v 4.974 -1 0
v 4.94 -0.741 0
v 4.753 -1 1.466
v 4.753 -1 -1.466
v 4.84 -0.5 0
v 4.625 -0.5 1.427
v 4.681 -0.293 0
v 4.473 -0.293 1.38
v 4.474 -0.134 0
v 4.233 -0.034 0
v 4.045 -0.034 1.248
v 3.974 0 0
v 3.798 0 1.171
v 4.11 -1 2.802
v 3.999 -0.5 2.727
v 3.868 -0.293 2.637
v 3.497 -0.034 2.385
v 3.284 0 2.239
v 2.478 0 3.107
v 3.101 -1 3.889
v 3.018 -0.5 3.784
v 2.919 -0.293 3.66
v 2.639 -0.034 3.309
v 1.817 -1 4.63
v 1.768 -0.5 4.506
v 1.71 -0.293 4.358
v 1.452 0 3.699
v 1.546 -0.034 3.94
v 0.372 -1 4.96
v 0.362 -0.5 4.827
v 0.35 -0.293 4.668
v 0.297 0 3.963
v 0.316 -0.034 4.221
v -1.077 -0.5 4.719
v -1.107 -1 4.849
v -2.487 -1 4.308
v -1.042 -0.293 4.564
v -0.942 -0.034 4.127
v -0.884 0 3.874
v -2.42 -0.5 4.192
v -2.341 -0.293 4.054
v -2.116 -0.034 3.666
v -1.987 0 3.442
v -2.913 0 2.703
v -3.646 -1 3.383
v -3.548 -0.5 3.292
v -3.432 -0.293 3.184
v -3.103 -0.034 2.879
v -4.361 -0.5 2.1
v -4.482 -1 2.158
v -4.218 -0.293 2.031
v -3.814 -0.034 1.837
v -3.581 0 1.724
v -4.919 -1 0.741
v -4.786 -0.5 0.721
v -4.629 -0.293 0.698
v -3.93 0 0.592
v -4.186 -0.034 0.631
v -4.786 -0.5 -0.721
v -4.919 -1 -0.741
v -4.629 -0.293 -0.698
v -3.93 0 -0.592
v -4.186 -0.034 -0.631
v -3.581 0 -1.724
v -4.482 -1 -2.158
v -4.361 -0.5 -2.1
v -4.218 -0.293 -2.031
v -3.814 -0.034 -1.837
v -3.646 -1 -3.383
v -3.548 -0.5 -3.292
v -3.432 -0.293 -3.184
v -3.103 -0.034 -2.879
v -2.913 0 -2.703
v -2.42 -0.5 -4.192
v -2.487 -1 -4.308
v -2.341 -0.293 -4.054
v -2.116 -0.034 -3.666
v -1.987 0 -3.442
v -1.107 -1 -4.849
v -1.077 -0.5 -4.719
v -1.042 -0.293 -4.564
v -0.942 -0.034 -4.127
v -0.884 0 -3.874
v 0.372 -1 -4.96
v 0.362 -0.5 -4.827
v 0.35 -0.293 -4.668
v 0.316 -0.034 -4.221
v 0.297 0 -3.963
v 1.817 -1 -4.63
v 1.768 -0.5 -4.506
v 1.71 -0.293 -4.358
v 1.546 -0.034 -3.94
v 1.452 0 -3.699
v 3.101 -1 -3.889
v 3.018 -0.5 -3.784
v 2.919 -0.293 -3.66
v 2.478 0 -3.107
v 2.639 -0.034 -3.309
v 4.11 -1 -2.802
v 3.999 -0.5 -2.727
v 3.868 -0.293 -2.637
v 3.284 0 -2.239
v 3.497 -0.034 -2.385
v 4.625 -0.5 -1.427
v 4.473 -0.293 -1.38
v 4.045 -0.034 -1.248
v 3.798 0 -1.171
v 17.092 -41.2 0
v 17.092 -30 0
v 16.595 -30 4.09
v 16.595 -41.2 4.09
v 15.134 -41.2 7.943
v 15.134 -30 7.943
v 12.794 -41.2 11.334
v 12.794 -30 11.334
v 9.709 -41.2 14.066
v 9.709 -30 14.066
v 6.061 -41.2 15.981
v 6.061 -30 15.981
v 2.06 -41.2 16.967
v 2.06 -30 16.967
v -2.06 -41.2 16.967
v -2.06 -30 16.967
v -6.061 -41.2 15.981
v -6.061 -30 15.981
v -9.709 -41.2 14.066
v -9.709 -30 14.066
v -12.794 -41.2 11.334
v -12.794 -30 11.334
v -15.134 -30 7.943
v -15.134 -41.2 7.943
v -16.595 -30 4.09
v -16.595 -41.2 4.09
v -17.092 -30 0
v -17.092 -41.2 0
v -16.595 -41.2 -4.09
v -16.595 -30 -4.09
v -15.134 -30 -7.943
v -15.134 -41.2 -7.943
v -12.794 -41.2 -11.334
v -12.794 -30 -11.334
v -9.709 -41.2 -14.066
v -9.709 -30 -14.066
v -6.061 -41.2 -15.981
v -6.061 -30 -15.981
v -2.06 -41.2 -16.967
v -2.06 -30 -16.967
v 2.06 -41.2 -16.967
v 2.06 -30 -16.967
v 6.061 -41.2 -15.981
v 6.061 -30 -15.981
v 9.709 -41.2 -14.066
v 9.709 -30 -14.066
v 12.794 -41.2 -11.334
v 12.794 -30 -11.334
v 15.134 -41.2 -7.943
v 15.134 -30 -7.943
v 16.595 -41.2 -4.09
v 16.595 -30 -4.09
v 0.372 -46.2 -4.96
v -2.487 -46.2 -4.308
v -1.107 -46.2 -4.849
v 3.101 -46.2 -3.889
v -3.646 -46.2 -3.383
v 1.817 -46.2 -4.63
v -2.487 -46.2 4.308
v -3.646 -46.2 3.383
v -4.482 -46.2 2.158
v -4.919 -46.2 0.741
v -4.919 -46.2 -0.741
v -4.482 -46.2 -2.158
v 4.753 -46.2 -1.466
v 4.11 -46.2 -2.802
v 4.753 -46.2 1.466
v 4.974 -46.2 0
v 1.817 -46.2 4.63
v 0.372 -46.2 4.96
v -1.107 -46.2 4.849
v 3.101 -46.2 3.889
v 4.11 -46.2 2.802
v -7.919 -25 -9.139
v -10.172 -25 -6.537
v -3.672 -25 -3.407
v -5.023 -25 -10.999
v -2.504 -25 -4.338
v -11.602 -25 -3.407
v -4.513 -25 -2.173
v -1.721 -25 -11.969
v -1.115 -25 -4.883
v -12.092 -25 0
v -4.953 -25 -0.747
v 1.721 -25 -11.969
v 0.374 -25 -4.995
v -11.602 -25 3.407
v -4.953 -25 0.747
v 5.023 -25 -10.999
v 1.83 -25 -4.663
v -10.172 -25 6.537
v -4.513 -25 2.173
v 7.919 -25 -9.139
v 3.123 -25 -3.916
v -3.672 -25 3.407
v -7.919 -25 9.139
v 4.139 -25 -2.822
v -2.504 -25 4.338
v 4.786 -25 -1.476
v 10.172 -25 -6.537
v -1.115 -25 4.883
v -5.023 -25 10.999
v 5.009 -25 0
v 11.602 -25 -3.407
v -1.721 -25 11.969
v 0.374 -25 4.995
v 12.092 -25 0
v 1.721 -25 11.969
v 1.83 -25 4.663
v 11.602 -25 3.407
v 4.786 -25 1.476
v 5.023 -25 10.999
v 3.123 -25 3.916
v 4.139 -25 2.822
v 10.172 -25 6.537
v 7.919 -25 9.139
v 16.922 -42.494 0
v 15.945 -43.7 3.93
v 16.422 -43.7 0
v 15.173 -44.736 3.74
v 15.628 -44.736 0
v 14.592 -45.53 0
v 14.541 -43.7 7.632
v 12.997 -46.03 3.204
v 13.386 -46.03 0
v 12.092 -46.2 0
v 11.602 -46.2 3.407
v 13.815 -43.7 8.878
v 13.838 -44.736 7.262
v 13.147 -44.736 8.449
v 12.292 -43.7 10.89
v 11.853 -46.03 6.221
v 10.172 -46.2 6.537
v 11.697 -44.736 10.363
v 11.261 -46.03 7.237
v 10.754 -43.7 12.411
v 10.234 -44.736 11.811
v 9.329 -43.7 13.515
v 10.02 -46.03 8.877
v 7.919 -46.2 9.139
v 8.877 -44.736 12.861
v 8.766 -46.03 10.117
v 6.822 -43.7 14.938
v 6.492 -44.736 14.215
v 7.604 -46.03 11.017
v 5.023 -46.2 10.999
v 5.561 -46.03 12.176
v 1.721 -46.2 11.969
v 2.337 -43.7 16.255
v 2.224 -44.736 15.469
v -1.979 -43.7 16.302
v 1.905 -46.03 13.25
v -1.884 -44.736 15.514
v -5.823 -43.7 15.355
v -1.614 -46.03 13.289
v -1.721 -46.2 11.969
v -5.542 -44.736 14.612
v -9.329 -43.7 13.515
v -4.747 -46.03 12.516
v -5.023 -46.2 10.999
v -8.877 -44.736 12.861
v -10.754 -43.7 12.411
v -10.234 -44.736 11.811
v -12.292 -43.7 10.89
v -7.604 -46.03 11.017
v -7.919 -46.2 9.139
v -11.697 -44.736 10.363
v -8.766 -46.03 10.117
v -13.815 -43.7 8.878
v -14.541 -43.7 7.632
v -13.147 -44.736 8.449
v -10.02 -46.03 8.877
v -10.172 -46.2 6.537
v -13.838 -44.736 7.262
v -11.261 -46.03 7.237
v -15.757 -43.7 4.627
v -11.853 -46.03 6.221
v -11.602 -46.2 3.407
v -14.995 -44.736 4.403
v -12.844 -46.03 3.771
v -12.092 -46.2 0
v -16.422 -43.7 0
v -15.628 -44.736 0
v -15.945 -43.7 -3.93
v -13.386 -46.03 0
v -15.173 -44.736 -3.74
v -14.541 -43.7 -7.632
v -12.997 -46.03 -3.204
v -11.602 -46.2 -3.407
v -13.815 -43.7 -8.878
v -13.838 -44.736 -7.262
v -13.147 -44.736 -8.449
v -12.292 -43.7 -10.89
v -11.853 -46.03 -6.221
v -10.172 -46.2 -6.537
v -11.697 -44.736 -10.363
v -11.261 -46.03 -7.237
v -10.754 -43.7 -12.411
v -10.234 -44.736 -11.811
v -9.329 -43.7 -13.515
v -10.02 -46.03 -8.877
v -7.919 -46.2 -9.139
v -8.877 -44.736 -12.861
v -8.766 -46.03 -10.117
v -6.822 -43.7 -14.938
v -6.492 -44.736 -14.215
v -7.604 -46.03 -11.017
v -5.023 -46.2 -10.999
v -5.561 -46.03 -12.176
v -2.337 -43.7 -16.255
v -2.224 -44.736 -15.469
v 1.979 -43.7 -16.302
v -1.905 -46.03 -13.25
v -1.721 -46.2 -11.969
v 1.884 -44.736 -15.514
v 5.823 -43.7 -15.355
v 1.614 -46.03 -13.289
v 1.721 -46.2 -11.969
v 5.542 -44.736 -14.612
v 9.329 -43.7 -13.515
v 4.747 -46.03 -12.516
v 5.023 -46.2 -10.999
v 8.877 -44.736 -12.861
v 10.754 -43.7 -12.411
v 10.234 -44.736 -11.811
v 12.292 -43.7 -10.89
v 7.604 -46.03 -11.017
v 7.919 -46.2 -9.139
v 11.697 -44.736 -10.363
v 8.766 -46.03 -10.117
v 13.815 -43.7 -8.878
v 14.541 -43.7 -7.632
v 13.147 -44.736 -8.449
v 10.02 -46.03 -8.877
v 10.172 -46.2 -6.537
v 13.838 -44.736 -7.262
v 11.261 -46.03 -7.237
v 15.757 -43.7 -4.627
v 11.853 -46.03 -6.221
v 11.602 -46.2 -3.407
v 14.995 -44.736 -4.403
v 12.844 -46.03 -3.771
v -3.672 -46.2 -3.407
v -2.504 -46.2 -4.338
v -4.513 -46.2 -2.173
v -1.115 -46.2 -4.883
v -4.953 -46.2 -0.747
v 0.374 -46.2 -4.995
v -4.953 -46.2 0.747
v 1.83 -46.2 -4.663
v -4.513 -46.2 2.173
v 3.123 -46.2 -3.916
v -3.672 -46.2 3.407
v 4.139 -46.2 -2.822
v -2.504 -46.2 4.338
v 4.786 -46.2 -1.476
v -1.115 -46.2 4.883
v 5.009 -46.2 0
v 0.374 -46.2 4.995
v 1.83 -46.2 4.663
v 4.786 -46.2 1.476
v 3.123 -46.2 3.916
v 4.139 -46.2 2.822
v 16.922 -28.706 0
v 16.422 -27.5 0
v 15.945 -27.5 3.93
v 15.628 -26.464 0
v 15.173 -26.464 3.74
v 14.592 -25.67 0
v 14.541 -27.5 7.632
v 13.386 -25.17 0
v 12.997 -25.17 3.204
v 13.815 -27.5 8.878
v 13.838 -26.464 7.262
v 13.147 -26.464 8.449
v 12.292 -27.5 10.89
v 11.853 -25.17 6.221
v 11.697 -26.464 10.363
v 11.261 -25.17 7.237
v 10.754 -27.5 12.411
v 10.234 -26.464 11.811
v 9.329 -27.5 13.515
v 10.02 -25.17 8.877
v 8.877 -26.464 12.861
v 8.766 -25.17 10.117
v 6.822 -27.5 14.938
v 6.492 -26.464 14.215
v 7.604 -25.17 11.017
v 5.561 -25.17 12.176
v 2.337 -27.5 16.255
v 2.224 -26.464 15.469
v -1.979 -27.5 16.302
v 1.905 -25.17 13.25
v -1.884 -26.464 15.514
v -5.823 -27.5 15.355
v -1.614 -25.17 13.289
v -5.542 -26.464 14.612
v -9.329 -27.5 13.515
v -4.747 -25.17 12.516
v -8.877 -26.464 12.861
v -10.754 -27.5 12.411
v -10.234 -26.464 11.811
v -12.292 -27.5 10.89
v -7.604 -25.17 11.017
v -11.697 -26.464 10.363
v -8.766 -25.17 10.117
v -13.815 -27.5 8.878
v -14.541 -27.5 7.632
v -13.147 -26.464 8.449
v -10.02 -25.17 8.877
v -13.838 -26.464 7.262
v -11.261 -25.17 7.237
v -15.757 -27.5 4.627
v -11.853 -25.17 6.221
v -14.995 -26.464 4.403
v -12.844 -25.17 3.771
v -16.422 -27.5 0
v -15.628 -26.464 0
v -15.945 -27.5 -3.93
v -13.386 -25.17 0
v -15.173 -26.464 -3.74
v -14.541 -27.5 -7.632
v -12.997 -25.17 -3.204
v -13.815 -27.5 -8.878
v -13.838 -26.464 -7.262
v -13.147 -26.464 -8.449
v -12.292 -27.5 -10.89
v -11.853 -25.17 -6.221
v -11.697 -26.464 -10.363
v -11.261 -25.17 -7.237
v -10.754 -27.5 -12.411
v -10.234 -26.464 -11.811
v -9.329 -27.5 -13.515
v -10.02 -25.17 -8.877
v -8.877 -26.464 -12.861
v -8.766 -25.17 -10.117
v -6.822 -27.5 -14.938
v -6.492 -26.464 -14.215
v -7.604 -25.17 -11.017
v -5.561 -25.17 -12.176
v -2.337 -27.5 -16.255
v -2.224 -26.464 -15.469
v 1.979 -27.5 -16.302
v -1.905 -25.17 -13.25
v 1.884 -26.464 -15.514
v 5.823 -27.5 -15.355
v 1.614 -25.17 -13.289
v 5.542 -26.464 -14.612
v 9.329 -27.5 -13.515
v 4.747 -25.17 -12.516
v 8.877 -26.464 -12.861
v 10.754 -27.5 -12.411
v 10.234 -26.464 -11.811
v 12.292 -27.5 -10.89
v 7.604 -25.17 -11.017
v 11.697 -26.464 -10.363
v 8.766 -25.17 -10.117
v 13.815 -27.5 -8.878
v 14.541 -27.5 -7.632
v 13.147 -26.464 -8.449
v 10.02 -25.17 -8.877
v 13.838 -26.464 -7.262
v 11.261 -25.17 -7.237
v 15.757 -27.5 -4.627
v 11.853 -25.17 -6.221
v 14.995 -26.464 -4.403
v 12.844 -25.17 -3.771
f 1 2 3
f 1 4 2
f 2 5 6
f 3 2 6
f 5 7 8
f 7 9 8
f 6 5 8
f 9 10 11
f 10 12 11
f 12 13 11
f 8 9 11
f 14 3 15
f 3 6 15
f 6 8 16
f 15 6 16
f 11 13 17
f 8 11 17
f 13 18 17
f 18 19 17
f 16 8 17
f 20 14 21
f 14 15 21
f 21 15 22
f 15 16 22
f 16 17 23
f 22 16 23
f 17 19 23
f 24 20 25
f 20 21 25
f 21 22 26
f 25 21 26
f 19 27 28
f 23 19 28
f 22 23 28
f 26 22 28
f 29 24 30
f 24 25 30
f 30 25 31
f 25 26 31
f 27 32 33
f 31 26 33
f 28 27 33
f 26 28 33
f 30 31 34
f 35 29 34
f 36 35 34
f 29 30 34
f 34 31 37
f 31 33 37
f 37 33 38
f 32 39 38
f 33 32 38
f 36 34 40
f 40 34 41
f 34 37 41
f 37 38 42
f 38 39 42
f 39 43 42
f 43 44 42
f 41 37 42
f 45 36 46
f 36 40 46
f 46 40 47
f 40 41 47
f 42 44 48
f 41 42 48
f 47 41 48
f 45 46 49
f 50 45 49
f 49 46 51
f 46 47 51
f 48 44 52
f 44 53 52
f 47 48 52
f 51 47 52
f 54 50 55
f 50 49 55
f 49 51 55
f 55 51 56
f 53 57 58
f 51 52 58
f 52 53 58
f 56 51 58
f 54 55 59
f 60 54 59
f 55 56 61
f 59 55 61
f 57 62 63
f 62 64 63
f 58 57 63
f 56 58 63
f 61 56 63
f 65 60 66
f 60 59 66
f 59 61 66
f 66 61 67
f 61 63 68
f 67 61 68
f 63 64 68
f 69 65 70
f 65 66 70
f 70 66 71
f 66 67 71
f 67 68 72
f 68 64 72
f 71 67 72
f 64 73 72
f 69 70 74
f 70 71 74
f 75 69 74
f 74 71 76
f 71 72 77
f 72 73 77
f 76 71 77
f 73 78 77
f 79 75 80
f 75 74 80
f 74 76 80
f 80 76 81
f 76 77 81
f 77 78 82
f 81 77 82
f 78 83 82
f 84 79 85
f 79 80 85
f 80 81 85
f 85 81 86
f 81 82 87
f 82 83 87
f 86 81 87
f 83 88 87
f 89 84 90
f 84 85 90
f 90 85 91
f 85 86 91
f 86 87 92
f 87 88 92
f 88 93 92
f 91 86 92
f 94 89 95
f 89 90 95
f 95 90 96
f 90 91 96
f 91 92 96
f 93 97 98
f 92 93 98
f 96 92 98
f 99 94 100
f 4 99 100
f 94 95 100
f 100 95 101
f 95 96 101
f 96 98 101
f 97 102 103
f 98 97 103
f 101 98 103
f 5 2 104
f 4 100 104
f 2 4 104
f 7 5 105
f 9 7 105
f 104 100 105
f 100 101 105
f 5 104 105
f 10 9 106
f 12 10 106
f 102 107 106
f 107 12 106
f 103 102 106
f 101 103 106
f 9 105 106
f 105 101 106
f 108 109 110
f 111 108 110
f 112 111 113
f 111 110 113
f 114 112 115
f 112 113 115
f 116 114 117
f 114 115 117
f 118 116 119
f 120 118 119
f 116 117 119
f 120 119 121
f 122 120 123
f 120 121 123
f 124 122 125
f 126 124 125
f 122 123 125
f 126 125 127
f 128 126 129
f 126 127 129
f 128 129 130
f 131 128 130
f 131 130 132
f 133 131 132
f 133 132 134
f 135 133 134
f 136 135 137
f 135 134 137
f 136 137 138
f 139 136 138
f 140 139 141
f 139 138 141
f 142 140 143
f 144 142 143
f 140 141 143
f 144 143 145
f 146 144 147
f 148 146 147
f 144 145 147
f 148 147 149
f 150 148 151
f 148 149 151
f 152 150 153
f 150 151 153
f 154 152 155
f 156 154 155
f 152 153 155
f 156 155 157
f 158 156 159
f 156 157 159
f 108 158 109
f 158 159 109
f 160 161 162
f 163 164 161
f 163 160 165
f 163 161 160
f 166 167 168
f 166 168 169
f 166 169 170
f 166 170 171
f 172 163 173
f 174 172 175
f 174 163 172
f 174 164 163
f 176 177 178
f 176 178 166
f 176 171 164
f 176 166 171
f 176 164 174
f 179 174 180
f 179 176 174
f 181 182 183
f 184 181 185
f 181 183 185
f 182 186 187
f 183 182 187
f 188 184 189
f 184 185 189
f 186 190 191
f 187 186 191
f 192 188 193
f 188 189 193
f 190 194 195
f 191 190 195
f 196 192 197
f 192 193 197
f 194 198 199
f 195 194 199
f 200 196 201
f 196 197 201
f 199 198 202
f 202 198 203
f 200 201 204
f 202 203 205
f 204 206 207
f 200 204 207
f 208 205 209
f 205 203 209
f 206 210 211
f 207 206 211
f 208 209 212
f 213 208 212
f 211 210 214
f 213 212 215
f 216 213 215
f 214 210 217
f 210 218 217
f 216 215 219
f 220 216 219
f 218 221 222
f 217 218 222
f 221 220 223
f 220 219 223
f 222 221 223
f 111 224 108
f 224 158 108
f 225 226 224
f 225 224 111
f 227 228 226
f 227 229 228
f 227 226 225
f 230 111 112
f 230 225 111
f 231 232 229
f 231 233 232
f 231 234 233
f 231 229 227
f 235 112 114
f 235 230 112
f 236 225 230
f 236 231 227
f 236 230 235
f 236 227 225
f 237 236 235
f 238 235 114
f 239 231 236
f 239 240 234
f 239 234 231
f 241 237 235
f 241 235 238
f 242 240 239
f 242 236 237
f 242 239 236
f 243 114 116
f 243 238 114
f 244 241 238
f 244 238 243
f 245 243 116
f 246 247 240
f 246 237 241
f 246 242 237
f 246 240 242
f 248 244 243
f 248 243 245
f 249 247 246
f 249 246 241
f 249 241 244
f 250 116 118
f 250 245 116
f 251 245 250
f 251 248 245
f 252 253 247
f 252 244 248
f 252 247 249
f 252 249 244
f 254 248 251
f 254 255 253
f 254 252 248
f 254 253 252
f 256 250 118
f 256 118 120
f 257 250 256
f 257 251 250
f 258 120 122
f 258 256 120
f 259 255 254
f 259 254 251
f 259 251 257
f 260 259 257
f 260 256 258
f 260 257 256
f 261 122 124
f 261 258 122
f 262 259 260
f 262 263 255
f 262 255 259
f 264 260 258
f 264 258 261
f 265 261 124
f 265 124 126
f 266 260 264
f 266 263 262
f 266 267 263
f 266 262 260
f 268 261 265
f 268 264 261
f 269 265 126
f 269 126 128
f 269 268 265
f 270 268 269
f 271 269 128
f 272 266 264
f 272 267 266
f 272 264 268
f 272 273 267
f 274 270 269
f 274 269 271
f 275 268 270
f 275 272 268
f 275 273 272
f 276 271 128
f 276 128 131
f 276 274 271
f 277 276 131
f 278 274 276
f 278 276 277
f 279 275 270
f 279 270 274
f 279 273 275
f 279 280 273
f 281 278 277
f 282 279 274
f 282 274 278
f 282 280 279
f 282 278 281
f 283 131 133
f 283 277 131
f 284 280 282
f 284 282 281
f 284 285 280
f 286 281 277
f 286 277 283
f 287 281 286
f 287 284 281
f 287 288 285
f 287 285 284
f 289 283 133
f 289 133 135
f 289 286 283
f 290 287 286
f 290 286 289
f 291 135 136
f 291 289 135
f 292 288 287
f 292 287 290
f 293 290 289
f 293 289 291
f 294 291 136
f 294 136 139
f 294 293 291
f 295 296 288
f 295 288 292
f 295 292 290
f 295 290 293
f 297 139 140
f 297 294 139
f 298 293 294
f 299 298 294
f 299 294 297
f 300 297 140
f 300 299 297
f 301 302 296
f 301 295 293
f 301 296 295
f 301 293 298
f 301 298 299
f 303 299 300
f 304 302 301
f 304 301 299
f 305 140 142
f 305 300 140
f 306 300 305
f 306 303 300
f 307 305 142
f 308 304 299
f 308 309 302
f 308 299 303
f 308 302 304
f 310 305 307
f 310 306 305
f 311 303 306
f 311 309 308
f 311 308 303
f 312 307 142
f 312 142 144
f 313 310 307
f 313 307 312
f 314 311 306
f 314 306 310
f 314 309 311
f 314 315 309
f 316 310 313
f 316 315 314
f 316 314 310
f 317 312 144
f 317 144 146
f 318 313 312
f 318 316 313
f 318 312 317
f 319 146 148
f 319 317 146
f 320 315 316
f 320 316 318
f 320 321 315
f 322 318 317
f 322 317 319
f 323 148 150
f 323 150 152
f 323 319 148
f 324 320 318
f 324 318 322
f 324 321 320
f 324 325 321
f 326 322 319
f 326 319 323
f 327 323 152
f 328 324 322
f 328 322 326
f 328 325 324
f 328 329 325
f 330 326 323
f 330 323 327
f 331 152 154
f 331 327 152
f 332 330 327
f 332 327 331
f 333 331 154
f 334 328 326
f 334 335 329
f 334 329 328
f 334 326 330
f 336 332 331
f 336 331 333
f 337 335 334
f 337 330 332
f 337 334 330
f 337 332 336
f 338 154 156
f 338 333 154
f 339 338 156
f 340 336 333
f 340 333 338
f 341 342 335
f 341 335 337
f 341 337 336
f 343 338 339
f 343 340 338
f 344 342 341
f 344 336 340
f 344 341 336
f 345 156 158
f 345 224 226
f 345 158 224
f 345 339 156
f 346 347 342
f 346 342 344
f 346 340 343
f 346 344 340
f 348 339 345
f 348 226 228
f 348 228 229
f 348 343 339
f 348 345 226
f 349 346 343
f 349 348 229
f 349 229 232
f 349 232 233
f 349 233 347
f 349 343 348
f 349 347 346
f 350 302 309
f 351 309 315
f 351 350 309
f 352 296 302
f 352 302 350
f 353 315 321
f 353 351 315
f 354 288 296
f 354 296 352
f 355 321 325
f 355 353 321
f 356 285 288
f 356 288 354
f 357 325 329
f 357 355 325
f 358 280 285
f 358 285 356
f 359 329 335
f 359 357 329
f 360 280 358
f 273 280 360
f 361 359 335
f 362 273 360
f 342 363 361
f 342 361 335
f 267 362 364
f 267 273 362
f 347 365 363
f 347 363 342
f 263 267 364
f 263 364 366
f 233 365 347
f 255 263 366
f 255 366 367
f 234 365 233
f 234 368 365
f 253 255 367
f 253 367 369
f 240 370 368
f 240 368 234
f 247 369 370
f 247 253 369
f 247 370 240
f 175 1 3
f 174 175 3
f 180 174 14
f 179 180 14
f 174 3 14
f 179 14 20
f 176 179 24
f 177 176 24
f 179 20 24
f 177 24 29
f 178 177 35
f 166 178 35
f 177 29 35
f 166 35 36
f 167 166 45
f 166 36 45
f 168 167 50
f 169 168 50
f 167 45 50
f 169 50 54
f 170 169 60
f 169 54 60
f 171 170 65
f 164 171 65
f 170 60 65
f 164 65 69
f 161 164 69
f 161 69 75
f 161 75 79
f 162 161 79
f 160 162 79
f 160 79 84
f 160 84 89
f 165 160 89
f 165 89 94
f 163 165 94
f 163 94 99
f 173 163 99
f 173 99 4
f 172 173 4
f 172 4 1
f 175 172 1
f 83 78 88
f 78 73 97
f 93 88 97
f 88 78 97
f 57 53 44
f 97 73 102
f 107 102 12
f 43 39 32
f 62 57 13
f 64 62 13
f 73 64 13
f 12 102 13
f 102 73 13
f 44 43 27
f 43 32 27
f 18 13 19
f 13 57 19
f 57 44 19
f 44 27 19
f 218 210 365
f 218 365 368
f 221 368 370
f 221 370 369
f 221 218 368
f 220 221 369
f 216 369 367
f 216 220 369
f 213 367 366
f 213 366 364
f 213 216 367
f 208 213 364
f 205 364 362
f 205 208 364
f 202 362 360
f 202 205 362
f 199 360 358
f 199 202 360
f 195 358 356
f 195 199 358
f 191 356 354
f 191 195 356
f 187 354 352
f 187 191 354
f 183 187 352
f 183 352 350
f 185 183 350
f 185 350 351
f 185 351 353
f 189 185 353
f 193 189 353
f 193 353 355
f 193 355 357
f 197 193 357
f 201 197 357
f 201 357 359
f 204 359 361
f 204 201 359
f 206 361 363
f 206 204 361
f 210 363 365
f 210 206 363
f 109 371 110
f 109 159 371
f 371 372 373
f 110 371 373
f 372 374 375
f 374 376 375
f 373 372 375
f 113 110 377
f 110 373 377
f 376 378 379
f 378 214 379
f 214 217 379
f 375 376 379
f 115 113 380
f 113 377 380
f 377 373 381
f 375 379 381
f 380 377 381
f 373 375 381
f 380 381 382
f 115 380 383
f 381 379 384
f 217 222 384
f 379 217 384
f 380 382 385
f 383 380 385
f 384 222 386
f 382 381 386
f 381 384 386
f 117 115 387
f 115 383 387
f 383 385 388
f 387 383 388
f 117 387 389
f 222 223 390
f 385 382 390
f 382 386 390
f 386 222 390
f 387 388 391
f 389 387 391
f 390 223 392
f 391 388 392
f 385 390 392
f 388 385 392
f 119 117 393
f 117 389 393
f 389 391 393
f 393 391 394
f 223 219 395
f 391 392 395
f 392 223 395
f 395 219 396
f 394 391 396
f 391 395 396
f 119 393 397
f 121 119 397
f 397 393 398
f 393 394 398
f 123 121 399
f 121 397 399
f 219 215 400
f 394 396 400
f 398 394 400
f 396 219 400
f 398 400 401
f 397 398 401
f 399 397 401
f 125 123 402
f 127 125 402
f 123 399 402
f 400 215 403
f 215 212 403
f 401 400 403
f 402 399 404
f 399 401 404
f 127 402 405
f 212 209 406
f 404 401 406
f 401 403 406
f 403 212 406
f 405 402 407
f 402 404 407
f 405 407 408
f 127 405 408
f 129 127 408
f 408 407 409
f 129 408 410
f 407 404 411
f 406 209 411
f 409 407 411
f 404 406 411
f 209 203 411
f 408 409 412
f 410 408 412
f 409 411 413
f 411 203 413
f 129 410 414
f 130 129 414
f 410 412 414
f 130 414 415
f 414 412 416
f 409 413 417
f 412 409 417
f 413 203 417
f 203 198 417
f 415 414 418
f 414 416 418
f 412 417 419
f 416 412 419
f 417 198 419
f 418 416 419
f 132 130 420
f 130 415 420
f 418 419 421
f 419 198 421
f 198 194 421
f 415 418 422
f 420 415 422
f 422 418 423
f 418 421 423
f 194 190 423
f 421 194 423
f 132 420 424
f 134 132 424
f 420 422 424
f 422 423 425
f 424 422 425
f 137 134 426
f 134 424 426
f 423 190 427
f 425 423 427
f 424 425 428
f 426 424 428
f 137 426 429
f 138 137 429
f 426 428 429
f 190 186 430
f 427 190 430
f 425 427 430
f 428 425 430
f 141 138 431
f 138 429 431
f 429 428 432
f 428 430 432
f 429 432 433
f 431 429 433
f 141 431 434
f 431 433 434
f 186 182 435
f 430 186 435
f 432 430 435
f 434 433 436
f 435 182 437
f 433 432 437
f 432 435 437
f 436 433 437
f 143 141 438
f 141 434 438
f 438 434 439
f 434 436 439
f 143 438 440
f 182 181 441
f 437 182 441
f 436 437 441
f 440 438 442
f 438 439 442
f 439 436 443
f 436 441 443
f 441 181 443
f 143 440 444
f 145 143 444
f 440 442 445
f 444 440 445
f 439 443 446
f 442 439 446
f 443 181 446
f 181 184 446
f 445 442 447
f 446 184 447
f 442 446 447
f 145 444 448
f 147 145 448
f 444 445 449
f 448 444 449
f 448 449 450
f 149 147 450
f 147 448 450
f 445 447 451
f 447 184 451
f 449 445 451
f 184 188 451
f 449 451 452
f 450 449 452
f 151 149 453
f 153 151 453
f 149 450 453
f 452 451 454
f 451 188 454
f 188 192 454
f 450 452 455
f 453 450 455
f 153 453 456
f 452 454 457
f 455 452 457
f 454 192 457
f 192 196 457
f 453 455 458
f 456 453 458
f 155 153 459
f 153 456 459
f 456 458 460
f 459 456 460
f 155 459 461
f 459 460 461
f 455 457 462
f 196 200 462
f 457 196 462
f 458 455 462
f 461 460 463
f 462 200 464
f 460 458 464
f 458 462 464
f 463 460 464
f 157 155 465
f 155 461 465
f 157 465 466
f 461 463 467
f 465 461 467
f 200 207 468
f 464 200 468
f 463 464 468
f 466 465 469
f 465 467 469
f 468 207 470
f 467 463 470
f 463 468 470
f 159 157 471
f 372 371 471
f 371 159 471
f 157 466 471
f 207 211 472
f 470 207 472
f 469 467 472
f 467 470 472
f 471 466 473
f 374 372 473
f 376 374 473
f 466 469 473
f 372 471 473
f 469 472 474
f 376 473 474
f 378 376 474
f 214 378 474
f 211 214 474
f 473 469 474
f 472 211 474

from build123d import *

# Parameters (mm, degrees)
F0_R     = 4.974125
F1_DEPTH = 25
F2_R     = 17.092044
F2_R_2   = 5.008881
F2_R_3   = 4.974125
F3_DEPTH = 21.2
F4_R     = 5
F5_R     = 5
F6_R     = 1


with BuildPart() as f1:
    # F0 (on Front) → F1 (new body)
    with BuildSketch(Plane.XZ):
        Circle(F0_R)
    extrude(amount=F1_DEPTH)

    # F2 (on face) → F3 (join)
    with BuildSketch(Plane.XZ.offset(25)):
        Circle(F2_R)
        Circle(F2_R_2, mode=Mode.SUBTRACT)
        Circle(F2_R_3)
    extrude(amount=F3_DEPTH)

    # F4
    f4_edges = [f1.edges().sort_by_distance(p)[0] for p in [
        (-17.092044, -46.2, 0),
    ]]
    fillet(f4_edges, radius=F4_R)

    # F5
    f5_edges = [f1.edges().sort_by_distance(p)[0] for p in [
        (-17.092044, -25, 0),
    ]]
    fillet(f5_edges, radius=F5_R)

    # F6
    f6_edges = [f1.edges().sort_by_distance(p)[0] for p in [
        (-4.974125, 0, 0),
    ]]
    fillet(f6_edges, radius=F6_R)


solid = f1.part
